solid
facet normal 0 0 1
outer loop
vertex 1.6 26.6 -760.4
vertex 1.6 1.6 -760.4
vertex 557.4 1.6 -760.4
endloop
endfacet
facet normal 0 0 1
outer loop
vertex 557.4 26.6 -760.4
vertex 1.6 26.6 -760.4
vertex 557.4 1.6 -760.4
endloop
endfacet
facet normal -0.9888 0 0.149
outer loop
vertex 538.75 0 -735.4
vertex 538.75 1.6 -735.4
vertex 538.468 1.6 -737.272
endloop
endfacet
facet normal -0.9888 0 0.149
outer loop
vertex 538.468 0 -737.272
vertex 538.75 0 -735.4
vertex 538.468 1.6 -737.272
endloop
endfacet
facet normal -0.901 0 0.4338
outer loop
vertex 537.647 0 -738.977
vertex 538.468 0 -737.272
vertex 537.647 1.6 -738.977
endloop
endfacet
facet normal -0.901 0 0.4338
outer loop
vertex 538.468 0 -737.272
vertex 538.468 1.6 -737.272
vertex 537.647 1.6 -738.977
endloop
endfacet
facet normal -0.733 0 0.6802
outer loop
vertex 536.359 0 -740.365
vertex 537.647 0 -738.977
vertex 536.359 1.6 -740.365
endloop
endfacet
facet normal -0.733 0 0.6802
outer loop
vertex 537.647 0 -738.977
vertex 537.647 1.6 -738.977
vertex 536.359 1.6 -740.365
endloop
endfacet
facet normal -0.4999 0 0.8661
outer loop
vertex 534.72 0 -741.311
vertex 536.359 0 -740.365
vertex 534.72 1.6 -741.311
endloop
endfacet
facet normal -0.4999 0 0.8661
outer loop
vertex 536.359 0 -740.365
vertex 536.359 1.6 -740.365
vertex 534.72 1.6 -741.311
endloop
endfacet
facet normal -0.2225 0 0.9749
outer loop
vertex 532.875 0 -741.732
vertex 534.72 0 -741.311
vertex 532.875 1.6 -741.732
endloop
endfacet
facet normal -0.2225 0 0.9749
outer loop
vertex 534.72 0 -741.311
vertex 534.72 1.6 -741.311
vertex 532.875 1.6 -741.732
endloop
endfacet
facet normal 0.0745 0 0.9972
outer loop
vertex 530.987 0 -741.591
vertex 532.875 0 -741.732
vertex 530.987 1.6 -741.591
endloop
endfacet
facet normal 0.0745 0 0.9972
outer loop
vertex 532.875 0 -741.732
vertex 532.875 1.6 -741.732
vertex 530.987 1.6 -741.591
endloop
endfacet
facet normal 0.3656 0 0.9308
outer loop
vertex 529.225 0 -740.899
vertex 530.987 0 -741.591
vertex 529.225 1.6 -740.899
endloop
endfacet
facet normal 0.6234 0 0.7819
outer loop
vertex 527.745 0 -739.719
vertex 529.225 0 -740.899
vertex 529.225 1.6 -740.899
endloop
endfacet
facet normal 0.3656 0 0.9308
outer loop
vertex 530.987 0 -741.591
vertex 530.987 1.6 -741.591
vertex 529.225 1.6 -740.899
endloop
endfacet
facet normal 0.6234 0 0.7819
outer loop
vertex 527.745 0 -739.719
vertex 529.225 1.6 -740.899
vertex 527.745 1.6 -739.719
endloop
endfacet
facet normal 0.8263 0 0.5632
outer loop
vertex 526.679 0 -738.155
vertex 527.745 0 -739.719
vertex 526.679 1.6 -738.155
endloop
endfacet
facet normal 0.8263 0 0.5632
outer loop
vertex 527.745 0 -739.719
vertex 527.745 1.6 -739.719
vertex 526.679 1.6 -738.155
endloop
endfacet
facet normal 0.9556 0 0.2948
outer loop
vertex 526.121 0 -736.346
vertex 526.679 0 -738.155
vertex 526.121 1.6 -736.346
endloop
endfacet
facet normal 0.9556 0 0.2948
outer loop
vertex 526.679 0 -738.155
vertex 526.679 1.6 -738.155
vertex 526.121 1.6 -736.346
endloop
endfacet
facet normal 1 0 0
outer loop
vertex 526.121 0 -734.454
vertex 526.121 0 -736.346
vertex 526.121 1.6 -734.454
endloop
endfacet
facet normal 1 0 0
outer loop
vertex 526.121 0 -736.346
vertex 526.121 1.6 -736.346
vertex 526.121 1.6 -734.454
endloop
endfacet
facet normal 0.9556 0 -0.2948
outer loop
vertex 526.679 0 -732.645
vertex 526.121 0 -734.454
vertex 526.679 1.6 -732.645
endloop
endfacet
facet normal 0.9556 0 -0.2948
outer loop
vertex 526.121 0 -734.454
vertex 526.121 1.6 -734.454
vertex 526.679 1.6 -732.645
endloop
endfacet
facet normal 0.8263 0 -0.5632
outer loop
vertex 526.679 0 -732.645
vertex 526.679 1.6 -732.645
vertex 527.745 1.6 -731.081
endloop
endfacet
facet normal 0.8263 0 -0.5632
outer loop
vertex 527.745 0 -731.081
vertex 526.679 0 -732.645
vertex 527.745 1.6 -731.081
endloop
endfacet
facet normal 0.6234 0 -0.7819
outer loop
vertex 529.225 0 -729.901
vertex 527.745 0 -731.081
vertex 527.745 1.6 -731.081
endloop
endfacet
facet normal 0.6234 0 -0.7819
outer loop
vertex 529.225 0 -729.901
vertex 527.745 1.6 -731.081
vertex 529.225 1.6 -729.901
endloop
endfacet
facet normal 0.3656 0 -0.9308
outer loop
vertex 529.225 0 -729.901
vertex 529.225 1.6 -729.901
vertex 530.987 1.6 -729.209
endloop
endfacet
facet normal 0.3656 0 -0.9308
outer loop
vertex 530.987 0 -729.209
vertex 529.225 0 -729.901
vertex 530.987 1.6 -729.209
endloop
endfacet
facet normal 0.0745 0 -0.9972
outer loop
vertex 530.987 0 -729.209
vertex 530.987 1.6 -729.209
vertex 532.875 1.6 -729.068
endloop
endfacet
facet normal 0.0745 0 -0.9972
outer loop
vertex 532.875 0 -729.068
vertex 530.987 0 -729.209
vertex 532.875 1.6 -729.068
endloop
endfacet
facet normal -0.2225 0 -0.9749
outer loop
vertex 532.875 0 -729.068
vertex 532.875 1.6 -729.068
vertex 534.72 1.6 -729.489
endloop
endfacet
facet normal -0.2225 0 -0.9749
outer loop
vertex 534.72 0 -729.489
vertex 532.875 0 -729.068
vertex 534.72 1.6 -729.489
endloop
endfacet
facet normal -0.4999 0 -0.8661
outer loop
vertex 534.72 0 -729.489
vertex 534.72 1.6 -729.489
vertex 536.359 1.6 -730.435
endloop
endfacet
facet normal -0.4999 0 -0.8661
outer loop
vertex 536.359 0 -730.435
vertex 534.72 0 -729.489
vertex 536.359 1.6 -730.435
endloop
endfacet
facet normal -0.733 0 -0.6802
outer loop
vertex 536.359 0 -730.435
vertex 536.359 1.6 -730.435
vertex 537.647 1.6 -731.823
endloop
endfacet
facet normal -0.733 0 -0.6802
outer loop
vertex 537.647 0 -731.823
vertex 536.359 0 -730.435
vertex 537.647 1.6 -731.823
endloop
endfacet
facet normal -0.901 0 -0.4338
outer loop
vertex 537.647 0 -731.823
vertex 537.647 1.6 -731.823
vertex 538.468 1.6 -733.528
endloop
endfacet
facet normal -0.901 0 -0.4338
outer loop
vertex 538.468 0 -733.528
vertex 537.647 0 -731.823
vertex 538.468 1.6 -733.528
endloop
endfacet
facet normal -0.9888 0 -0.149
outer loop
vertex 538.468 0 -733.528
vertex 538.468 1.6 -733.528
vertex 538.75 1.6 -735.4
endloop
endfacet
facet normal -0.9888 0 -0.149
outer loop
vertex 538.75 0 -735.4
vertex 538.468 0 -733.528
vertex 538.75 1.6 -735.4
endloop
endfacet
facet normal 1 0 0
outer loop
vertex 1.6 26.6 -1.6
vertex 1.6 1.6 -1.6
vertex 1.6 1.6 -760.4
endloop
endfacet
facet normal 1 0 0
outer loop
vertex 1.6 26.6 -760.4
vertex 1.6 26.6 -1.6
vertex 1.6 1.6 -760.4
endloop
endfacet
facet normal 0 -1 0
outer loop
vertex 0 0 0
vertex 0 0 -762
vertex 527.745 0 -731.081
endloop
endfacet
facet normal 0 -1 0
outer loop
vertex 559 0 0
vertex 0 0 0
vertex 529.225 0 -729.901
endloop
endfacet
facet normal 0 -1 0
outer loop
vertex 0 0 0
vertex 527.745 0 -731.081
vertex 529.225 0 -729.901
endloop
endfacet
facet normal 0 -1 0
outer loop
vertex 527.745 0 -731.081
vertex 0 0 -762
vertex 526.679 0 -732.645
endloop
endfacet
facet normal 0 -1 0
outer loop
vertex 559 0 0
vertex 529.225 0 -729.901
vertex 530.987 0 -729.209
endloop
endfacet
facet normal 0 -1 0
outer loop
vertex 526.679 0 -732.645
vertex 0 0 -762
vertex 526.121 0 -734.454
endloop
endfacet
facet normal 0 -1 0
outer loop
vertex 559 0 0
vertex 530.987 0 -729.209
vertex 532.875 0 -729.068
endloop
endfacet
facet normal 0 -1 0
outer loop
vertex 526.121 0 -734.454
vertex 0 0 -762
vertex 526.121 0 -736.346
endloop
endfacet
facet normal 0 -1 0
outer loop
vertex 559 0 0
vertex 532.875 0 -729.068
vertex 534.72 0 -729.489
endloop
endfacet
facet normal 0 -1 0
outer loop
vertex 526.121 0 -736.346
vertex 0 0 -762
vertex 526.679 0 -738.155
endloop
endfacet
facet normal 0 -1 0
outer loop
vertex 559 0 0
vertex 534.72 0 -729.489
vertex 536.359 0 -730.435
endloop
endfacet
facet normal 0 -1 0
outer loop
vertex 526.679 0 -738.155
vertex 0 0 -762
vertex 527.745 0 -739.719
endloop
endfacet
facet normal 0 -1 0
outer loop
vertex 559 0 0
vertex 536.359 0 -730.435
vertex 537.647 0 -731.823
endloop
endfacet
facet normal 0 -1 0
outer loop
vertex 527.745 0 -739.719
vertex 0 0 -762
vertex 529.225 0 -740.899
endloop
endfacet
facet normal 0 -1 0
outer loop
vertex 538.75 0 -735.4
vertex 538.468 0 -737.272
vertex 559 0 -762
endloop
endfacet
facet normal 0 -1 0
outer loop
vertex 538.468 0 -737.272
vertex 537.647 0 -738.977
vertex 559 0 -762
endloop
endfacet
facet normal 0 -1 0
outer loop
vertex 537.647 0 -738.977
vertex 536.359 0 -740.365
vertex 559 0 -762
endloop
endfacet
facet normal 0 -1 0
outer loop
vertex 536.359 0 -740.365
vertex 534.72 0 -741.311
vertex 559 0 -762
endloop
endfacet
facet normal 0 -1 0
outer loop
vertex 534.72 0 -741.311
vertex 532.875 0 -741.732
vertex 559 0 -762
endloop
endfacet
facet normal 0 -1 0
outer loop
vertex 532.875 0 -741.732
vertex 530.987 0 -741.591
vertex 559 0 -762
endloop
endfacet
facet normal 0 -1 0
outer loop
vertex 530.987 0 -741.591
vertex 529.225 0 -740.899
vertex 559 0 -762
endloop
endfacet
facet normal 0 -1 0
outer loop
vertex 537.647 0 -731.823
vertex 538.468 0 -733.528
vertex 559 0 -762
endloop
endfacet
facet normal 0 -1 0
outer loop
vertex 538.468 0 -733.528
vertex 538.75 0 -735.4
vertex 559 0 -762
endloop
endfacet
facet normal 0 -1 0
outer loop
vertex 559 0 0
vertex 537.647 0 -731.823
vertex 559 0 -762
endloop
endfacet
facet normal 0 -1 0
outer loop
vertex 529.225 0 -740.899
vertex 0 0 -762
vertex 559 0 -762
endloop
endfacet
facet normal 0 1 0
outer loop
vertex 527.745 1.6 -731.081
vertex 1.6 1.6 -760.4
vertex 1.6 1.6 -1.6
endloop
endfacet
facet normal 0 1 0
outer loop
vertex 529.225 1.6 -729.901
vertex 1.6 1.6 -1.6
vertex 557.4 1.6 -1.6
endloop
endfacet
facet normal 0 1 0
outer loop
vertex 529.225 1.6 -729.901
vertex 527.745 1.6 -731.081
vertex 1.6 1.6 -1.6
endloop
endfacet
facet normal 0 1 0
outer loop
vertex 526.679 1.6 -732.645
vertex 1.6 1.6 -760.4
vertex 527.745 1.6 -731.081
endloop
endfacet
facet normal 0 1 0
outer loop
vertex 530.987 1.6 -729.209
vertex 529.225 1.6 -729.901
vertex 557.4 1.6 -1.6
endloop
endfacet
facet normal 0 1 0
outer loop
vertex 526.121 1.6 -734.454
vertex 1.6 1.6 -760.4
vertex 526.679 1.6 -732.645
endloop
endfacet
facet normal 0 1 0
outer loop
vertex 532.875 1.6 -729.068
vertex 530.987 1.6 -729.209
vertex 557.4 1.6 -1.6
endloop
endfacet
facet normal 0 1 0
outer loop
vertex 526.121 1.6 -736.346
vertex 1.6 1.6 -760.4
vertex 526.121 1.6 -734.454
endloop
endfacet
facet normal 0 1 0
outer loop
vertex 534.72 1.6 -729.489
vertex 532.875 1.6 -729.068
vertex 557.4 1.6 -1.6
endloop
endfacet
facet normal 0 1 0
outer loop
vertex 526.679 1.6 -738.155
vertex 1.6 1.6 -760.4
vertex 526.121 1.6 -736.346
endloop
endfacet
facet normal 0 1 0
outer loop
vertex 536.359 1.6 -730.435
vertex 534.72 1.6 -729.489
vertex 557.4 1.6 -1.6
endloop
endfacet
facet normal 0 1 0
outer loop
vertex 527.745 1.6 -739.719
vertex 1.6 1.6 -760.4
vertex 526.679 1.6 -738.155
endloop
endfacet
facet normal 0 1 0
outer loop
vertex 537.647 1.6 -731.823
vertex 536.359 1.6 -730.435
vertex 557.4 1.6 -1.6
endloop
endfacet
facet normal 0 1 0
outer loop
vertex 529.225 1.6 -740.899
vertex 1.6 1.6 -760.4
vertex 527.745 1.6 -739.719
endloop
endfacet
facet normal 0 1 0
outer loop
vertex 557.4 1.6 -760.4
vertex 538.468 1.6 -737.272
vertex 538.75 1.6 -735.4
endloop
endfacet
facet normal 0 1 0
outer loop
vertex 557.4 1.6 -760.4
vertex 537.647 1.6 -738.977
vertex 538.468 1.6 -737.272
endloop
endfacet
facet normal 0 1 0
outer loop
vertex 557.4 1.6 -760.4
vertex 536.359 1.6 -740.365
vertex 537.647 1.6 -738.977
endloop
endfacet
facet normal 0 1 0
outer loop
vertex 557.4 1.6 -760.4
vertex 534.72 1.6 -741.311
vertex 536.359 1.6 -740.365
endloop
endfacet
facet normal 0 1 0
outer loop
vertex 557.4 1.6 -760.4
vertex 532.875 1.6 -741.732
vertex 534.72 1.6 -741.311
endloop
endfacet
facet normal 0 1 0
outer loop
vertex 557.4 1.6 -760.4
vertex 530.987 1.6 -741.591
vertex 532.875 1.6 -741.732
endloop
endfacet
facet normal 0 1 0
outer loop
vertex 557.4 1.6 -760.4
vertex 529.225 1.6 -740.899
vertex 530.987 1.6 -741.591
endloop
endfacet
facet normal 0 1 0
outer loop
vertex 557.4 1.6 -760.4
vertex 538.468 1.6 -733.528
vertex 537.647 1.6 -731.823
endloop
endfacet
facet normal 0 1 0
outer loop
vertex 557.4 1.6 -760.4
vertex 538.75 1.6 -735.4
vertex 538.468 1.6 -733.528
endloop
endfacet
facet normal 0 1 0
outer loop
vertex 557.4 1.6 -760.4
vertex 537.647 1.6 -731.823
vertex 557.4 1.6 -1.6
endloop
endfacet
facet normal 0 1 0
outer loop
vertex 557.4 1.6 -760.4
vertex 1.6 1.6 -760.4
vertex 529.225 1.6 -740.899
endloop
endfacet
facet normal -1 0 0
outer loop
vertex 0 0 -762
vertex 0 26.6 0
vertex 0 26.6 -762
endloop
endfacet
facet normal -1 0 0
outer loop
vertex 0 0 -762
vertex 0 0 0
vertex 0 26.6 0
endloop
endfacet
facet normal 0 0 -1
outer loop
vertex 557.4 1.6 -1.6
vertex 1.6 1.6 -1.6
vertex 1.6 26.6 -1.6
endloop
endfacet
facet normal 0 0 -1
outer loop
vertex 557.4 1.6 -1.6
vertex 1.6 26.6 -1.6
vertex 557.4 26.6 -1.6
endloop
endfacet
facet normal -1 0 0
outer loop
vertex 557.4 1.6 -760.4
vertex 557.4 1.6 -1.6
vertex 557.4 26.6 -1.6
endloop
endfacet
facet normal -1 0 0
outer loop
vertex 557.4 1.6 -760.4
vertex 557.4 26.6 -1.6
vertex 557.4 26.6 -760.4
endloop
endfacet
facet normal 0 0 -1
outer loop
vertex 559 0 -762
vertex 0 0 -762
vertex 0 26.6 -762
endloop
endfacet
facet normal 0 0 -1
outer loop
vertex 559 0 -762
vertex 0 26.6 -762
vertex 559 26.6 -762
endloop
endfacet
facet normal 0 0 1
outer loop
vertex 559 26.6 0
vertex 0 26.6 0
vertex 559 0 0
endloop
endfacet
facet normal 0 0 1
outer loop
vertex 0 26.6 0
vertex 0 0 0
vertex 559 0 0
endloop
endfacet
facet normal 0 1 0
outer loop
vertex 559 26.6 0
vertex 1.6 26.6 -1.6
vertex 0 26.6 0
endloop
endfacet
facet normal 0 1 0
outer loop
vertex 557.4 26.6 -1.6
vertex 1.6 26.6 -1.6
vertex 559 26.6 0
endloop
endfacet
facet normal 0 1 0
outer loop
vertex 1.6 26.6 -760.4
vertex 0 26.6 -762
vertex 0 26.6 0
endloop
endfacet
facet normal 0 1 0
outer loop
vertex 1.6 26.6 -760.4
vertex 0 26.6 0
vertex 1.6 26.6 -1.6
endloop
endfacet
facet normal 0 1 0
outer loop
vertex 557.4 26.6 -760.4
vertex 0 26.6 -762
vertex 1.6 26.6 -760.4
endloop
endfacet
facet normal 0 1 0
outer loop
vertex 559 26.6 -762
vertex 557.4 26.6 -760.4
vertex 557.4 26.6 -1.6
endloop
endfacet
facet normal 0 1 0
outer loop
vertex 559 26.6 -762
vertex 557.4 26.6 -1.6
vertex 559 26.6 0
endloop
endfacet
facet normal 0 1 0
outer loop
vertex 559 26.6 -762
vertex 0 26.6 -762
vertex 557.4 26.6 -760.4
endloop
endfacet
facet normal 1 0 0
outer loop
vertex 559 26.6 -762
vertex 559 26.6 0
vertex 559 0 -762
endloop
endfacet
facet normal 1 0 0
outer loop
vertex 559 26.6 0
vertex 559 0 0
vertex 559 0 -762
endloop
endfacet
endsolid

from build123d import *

# Parameters (mm, degrees)
SKETCH1_W           = 559
SKETCH1_H           = 762
BOSS_EXTRUDE1_DEPTH = 1.6
SKETCH2_W           = 559
SKETCH2_H           = 762
SKETCH2_W_2         = 555.8
SKETCH2_H_2         = 758.8
BOSS_EXTRUDE2_DEPTH = 25
SKETCH3_R           = 6.35
CUT_EXTRUDE1_DEPTH  = 2.6


with BuildPart() as part:
    # Sketch1 → Boss-Extrude1 (new body)
    with BuildSketch(Plane(origin=(0, 0, 0), x_dir=(1, 0, 0), z_dir=(0, 1, 0))):
        with Locations((279.5, 381)):
            Rectangle(SKETCH1_W, SKETCH1_H)
    extrude(amount=BOSS_EXTRUDE1_DEPTH)

    # Sketch2 → Boss-Extrude2 (add)
    with BuildSketch(Plane(origin=(0, 1.6, 0), x_dir=(1, 0, 0), z_dir=(0, 1, 0))):
        with Locations((279.5, 381)):
            Rectangle(SKETCH2_W, SKETCH2_H)
        with Locations((279.5, 381)):
            Rectangle(SKETCH2_W_2, SKETCH2_H_2, mode=Mode.SUBTRACT)
    extrude(amount=BOSS_EXTRUDE2_DEPTH)

    # Sketch3 → Cut-Extrude1 (cut, through all)
    with BuildSketch(Plane(origin=(0, 1.6, 0), x_dir=(1, 0, 0), z_dir=(0, 1, 0))):
        with Locations((532.4, 735.4)):
            Circle(SKETCH3_R)
    extrude(amount=-CUT_EXTRUDE1_DEPTH, mode=Mode.SUBTRACT)


solid = part.part
